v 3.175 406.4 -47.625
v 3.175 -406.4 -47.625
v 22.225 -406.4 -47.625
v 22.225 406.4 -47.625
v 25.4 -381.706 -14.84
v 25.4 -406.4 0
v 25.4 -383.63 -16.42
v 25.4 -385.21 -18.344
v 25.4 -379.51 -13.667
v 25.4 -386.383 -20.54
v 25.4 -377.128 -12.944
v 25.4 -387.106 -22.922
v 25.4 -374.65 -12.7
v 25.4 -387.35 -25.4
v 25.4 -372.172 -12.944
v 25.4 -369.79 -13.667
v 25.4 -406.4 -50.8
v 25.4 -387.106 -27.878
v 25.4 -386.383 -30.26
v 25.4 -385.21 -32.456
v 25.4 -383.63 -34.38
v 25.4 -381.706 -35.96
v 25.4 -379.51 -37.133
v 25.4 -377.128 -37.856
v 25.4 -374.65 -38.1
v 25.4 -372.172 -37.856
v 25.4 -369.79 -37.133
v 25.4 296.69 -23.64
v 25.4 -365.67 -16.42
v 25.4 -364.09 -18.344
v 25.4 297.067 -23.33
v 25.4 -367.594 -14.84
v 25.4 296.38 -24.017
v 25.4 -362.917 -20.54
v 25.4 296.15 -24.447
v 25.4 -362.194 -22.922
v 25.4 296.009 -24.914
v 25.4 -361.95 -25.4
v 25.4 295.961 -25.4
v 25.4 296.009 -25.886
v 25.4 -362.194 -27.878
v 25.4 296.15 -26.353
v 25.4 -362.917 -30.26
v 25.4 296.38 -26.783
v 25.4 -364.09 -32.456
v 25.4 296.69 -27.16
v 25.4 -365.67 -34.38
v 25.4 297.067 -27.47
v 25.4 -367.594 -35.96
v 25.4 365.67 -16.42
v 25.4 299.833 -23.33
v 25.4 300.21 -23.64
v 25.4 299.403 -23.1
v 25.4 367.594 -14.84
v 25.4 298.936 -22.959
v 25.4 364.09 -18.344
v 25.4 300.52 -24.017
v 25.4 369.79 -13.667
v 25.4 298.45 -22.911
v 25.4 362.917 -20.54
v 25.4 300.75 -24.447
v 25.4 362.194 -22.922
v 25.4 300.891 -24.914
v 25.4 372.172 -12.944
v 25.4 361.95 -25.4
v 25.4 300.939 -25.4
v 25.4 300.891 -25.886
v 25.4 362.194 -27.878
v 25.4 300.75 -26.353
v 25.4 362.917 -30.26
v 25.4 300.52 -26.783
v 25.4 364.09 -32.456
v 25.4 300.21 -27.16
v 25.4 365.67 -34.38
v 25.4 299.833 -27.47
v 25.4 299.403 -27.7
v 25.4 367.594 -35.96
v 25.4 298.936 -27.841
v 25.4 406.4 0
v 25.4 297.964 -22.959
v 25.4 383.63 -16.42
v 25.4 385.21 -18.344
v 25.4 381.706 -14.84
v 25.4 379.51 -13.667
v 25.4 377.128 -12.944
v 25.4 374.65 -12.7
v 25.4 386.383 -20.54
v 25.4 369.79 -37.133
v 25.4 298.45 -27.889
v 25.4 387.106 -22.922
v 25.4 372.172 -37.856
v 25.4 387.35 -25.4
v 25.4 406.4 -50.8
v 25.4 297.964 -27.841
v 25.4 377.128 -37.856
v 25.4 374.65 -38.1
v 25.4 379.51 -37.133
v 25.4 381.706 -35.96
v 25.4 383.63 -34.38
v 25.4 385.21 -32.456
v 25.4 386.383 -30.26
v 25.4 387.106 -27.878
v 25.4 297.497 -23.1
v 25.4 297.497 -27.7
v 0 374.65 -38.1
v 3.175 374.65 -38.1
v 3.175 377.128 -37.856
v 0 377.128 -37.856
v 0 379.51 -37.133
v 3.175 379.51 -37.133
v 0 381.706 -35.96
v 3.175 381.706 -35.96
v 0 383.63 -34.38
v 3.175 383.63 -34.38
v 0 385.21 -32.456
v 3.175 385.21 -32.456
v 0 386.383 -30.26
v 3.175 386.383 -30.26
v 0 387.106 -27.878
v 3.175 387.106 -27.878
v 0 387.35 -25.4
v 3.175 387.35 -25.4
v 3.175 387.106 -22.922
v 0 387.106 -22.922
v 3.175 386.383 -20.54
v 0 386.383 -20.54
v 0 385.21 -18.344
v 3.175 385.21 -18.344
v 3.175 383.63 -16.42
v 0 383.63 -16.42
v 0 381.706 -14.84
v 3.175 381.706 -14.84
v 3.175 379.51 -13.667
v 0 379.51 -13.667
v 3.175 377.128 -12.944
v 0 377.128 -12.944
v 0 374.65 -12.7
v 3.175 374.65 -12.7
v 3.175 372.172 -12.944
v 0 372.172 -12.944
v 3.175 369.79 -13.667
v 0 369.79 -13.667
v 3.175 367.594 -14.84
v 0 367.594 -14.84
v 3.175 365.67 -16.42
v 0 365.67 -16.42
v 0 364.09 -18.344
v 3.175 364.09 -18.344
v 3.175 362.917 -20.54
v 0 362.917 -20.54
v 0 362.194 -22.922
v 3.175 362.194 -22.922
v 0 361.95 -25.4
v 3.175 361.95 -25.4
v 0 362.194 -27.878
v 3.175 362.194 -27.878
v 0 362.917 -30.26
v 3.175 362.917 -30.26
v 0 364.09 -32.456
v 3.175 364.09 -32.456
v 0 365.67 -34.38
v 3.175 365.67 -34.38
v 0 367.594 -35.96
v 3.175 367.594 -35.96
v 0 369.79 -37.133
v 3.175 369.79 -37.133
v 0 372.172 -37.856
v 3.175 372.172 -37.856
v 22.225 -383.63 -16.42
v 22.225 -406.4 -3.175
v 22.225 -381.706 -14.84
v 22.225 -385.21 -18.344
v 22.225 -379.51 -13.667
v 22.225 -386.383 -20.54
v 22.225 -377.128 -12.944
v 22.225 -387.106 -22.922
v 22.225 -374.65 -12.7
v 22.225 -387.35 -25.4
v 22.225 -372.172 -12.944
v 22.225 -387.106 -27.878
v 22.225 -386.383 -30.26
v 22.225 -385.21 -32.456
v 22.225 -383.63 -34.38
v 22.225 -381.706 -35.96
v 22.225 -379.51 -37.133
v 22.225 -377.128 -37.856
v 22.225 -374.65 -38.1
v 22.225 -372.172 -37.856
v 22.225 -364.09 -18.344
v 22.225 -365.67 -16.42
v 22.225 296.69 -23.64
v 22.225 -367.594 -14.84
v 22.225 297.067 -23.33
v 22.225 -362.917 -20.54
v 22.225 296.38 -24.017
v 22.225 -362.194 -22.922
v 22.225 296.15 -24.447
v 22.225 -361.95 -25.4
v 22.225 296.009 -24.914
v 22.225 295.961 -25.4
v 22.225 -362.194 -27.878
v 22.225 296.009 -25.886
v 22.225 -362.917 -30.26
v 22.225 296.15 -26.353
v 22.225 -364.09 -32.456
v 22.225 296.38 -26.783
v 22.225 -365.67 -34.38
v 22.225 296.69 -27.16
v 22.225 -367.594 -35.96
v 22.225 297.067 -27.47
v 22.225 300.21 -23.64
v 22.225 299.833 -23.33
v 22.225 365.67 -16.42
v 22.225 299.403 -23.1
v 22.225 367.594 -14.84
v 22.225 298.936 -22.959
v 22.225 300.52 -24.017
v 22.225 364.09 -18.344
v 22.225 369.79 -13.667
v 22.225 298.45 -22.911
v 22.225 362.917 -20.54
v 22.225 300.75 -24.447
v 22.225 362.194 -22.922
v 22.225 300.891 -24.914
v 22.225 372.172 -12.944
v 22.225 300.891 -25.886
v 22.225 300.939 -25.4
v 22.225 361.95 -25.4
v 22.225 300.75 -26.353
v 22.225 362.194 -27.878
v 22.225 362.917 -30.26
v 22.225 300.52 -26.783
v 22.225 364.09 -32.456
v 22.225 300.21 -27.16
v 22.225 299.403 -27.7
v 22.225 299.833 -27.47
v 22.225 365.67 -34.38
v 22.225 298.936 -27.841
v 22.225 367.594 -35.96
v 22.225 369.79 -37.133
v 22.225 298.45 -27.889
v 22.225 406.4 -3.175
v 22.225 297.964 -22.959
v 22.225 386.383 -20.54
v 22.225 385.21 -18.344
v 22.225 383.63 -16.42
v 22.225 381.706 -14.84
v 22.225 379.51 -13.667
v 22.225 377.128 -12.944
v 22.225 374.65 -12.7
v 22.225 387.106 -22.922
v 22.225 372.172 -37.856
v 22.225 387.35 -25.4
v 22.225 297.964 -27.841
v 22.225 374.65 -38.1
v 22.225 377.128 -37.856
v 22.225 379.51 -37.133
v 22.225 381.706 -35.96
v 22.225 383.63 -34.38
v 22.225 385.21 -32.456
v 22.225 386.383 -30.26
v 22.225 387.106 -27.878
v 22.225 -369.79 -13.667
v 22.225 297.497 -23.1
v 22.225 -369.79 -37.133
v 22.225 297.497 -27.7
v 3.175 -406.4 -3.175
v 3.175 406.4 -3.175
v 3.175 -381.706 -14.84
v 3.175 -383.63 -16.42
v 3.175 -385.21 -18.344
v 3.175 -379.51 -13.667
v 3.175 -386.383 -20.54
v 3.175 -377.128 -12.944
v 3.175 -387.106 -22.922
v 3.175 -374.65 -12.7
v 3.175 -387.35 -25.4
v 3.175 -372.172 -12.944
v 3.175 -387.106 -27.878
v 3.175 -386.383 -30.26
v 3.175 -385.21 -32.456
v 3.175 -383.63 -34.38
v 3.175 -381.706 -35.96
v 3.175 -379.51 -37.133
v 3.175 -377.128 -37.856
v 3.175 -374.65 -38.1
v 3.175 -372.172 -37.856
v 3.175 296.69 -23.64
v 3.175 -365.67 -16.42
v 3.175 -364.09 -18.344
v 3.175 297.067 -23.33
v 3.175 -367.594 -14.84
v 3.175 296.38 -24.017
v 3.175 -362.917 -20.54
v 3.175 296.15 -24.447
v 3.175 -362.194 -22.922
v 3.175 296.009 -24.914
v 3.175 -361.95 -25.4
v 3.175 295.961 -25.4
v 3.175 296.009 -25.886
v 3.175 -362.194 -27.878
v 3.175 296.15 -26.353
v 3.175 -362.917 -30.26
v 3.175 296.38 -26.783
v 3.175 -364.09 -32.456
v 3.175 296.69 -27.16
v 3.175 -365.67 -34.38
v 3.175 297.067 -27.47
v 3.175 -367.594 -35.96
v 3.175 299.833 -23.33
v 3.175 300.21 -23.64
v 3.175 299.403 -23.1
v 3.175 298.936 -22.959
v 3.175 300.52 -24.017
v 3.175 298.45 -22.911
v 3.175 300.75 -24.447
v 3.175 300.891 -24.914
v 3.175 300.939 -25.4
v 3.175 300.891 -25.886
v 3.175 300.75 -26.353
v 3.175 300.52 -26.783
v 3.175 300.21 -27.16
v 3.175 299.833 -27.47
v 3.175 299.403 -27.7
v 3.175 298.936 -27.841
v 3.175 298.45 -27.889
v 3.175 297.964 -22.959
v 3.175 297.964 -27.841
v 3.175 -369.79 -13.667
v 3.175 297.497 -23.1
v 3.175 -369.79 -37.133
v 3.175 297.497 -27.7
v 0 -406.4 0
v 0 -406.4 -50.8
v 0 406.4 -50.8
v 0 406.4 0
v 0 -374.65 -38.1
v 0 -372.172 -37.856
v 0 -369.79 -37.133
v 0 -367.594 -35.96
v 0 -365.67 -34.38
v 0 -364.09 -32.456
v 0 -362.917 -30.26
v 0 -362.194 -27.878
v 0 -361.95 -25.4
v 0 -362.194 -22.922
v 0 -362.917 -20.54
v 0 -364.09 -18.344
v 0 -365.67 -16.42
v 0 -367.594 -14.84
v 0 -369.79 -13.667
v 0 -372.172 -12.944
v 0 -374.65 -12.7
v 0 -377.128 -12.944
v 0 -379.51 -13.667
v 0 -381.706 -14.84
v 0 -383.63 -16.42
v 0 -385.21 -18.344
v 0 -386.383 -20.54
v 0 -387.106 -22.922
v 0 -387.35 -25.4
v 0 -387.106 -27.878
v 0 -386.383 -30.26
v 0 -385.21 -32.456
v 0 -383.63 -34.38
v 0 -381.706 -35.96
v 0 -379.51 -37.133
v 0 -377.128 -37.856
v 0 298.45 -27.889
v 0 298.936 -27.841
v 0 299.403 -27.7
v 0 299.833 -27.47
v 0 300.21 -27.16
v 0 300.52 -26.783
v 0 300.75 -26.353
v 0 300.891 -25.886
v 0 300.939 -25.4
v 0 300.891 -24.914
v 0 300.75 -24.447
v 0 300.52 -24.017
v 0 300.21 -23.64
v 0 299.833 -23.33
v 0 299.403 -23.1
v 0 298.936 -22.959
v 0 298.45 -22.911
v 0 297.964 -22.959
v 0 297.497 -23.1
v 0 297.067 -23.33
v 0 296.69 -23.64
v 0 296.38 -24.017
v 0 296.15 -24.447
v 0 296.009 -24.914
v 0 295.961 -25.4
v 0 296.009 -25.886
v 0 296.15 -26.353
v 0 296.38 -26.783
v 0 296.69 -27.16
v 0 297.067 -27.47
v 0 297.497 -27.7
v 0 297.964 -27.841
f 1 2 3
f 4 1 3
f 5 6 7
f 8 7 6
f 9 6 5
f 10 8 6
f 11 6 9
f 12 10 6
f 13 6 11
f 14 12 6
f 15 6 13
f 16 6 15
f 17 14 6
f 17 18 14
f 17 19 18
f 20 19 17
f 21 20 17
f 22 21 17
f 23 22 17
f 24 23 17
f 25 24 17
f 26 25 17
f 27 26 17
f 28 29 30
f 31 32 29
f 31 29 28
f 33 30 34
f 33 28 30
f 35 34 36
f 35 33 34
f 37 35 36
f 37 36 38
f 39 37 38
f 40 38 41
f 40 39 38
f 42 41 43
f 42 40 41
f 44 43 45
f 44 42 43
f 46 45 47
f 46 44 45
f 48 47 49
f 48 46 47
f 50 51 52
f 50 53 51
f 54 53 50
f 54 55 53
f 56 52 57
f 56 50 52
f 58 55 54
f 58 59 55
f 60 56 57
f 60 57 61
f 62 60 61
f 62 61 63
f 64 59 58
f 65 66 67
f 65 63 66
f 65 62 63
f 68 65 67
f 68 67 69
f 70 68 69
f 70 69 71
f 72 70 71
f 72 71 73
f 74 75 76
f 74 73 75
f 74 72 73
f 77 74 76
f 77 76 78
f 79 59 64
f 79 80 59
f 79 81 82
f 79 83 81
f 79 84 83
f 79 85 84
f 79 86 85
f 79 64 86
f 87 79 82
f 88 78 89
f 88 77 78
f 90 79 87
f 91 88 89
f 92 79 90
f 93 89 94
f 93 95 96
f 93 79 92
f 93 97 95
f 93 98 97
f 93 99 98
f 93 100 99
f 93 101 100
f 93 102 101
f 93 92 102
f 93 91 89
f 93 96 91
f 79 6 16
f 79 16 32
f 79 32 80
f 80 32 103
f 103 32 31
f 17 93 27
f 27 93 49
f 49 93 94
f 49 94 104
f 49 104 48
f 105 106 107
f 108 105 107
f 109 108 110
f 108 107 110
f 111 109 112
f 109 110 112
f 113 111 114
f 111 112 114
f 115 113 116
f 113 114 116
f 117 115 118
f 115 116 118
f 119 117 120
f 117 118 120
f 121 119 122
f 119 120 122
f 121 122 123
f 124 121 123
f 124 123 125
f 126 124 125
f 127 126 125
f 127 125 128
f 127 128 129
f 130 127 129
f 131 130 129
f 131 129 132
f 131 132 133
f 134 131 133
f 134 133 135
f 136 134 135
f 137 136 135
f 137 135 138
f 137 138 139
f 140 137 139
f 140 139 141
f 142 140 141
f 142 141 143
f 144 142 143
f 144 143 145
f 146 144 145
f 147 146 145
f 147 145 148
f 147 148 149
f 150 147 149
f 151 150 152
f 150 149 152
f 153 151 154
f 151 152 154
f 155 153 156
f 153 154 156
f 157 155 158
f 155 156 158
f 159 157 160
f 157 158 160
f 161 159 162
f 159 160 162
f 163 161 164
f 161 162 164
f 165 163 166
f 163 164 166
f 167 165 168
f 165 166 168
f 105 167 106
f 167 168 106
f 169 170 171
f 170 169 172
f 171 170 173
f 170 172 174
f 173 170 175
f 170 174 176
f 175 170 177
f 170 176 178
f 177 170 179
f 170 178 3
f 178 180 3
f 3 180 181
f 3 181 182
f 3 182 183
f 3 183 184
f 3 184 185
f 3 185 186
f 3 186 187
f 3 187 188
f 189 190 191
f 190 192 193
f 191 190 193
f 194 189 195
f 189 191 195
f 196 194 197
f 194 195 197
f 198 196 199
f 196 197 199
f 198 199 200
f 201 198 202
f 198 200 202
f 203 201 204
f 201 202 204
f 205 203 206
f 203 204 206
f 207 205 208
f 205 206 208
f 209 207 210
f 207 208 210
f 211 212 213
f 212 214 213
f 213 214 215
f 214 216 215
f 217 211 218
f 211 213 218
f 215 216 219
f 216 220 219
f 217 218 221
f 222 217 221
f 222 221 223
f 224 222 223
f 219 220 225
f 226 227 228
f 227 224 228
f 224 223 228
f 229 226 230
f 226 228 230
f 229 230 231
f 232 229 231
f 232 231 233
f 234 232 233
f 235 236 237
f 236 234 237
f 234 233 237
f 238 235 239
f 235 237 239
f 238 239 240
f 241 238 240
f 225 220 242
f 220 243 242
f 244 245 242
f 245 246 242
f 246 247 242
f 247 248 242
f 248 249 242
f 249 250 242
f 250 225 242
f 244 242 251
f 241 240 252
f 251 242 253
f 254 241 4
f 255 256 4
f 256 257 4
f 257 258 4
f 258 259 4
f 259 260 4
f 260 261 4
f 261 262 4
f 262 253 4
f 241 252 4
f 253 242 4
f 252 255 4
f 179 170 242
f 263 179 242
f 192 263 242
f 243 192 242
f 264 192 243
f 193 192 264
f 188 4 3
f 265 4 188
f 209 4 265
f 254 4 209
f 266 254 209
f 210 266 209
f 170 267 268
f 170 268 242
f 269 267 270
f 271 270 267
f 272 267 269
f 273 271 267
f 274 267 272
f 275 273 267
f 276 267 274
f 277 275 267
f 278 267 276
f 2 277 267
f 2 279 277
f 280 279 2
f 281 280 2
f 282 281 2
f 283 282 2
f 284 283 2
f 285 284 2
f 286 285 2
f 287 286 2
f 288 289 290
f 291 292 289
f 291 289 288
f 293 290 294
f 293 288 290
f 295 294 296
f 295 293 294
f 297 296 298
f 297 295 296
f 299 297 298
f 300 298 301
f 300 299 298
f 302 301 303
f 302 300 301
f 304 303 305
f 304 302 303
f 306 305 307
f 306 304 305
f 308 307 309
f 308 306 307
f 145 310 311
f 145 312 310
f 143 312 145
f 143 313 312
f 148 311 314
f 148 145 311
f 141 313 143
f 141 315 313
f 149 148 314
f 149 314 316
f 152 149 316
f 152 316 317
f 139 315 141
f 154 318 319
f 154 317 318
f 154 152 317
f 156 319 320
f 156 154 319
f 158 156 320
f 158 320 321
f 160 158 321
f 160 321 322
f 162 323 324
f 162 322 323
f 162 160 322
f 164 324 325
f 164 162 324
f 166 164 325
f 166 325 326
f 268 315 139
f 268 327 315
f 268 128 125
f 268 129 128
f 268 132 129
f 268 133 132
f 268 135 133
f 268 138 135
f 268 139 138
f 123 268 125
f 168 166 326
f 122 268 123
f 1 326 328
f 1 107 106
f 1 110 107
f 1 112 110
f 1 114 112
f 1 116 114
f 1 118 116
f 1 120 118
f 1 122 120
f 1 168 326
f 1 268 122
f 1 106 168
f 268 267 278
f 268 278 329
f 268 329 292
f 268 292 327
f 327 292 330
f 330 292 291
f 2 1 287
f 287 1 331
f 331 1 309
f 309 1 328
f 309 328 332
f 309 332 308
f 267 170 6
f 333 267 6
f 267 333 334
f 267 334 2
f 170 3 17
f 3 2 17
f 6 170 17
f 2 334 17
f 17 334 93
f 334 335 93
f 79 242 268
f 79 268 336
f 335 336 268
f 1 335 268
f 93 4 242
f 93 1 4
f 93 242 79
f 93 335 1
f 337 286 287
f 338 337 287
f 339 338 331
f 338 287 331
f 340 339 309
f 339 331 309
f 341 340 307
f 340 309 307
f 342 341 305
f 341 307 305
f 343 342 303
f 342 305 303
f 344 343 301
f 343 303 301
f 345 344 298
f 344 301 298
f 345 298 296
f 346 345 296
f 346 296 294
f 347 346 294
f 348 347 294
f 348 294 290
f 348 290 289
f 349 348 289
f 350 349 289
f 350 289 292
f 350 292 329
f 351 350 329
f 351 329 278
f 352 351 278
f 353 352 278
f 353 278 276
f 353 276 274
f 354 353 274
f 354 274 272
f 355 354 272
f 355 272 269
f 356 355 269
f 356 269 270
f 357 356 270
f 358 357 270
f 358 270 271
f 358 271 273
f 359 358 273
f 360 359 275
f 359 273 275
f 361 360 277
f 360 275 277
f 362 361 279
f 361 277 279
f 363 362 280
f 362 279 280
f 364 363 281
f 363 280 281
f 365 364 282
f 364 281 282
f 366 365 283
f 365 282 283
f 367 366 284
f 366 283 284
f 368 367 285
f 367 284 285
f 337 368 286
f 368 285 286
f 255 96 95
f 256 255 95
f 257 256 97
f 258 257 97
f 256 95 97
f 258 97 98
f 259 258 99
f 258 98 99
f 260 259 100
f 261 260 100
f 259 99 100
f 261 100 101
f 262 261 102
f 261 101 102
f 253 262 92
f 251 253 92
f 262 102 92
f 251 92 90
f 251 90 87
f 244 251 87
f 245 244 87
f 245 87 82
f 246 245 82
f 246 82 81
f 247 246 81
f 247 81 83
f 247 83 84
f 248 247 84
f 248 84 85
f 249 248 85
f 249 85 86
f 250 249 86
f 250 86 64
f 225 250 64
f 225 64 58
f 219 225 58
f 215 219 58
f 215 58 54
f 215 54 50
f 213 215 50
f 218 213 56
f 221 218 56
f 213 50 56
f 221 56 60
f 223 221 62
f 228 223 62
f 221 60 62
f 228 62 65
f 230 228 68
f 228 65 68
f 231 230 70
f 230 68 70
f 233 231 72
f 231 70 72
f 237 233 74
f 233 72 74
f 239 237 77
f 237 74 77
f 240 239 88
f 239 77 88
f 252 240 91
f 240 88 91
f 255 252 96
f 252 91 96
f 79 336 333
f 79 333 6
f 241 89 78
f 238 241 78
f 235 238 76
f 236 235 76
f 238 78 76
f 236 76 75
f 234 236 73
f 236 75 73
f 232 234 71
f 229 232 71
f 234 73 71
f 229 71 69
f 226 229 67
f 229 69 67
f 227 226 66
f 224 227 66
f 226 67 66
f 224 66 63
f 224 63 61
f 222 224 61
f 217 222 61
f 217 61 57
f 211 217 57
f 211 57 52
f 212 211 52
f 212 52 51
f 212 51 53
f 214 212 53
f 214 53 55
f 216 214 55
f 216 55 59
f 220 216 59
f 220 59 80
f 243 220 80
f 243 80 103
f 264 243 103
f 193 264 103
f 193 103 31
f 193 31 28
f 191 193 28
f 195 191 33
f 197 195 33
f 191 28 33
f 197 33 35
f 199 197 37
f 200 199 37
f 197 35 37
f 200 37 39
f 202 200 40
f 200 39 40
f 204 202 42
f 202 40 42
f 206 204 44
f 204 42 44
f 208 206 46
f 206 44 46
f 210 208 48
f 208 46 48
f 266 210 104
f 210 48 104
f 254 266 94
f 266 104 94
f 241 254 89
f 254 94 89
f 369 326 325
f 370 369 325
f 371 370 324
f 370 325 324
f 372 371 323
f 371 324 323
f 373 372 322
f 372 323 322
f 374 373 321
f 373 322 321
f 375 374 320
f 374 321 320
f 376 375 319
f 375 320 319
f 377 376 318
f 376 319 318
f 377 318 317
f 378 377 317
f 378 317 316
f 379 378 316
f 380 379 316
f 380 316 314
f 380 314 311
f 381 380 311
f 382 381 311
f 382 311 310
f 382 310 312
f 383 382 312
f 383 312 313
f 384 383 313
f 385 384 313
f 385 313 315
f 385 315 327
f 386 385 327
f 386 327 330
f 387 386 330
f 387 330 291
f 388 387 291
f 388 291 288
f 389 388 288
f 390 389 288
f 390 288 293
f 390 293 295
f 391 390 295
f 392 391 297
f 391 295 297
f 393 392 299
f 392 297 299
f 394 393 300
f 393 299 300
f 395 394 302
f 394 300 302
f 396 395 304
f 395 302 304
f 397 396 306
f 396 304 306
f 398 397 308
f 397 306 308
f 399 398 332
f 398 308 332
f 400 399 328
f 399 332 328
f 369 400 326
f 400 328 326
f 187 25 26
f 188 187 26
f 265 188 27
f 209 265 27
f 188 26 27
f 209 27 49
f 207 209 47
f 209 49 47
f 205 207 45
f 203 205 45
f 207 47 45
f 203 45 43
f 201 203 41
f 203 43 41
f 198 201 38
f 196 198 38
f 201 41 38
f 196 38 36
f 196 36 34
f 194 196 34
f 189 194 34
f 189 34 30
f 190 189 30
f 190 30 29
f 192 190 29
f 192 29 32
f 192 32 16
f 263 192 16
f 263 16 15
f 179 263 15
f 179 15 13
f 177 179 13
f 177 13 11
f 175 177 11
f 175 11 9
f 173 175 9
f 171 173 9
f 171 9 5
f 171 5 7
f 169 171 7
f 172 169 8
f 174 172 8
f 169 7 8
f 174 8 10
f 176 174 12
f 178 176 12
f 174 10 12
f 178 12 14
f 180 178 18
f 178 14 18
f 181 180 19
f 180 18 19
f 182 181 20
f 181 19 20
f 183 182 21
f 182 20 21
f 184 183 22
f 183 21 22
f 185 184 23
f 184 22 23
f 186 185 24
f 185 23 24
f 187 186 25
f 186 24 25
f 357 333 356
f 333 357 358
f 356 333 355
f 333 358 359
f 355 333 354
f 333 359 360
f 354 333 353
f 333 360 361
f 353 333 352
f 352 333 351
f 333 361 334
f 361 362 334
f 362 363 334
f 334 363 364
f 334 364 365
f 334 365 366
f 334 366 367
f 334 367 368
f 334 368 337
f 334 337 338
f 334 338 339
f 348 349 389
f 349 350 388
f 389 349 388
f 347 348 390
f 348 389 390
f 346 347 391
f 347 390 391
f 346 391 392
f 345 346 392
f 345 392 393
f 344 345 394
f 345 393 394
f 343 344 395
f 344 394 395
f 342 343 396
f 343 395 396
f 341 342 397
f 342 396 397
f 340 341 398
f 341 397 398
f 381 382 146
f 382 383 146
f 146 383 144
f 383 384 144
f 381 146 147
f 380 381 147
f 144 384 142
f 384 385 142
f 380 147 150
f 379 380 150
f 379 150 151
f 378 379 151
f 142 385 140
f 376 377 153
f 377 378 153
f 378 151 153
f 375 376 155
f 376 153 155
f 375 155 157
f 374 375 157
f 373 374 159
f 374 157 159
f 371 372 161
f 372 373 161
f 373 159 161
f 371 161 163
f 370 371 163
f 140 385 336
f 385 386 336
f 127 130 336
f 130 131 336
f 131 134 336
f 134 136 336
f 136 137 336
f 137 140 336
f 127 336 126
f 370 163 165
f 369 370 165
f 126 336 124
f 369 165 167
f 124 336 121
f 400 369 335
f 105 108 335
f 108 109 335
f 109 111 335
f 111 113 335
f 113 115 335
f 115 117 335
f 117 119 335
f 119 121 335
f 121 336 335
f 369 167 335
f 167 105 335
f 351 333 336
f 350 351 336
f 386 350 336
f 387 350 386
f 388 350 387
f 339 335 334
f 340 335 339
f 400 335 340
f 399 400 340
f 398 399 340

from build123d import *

# Parameters (mm, degrees)
SKETCH1_W           = 25.4
SKETCH1_H           = 50.8
BOSS_EXTRUDE1_DEPTH = 406.4
SHELL1_T            = -3.175
SKETCH2_R           = 12.7
SKETCH2_R_2         = 2.4892
CUT_EXTRUDE1_DEPTH  = 411.349558304


with BuildPart() as part:
    # Sketch1 → Boss-Extrude1 (new, symmetric)
    with BuildSketch(Plane(origin=(0, 0, 0), x_dir=(1, 0, 0), z_dir=(0, 1, 0))):
        with Locations((12.7, 25.4)):
            Rectangle(SKETCH1_W, SKETCH1_H)
    extrude(amount=BOSS_EXTRUDE1_DEPTH, both=True)

    # Shell1
    shell1_openings = [part.faces().sort_by_distance(p)[0] for p in [
        (12.7, 406.4, -25.4),
        (12.7, -406.4, -25.4),
    ]]
    offset(amount=SHELL1_T, openings=shell1_openings, kind=Kind.INTERSECTION)

    # Sketch2 → Cut-Extrude1 (cut, through all)
    with BuildSketch(Plane(origin=(25.4, 0, 0), x_dir=(0, 0, -1), z_dir=(1, 0, 0))):
        with Locations((25.4, 374.65)):
            Circle(SKETCH2_R)
        with Locations((25.4, -374.65)):
            Circle(SKETCH2_R)
        with Locations((25.4, 298.45)):
            Circle(SKETCH2_R_2)
    extrude(amount=-CUT_EXTRUDE1_DEPTH, mode=Mode.SUBTRACT)


solid = part.part
